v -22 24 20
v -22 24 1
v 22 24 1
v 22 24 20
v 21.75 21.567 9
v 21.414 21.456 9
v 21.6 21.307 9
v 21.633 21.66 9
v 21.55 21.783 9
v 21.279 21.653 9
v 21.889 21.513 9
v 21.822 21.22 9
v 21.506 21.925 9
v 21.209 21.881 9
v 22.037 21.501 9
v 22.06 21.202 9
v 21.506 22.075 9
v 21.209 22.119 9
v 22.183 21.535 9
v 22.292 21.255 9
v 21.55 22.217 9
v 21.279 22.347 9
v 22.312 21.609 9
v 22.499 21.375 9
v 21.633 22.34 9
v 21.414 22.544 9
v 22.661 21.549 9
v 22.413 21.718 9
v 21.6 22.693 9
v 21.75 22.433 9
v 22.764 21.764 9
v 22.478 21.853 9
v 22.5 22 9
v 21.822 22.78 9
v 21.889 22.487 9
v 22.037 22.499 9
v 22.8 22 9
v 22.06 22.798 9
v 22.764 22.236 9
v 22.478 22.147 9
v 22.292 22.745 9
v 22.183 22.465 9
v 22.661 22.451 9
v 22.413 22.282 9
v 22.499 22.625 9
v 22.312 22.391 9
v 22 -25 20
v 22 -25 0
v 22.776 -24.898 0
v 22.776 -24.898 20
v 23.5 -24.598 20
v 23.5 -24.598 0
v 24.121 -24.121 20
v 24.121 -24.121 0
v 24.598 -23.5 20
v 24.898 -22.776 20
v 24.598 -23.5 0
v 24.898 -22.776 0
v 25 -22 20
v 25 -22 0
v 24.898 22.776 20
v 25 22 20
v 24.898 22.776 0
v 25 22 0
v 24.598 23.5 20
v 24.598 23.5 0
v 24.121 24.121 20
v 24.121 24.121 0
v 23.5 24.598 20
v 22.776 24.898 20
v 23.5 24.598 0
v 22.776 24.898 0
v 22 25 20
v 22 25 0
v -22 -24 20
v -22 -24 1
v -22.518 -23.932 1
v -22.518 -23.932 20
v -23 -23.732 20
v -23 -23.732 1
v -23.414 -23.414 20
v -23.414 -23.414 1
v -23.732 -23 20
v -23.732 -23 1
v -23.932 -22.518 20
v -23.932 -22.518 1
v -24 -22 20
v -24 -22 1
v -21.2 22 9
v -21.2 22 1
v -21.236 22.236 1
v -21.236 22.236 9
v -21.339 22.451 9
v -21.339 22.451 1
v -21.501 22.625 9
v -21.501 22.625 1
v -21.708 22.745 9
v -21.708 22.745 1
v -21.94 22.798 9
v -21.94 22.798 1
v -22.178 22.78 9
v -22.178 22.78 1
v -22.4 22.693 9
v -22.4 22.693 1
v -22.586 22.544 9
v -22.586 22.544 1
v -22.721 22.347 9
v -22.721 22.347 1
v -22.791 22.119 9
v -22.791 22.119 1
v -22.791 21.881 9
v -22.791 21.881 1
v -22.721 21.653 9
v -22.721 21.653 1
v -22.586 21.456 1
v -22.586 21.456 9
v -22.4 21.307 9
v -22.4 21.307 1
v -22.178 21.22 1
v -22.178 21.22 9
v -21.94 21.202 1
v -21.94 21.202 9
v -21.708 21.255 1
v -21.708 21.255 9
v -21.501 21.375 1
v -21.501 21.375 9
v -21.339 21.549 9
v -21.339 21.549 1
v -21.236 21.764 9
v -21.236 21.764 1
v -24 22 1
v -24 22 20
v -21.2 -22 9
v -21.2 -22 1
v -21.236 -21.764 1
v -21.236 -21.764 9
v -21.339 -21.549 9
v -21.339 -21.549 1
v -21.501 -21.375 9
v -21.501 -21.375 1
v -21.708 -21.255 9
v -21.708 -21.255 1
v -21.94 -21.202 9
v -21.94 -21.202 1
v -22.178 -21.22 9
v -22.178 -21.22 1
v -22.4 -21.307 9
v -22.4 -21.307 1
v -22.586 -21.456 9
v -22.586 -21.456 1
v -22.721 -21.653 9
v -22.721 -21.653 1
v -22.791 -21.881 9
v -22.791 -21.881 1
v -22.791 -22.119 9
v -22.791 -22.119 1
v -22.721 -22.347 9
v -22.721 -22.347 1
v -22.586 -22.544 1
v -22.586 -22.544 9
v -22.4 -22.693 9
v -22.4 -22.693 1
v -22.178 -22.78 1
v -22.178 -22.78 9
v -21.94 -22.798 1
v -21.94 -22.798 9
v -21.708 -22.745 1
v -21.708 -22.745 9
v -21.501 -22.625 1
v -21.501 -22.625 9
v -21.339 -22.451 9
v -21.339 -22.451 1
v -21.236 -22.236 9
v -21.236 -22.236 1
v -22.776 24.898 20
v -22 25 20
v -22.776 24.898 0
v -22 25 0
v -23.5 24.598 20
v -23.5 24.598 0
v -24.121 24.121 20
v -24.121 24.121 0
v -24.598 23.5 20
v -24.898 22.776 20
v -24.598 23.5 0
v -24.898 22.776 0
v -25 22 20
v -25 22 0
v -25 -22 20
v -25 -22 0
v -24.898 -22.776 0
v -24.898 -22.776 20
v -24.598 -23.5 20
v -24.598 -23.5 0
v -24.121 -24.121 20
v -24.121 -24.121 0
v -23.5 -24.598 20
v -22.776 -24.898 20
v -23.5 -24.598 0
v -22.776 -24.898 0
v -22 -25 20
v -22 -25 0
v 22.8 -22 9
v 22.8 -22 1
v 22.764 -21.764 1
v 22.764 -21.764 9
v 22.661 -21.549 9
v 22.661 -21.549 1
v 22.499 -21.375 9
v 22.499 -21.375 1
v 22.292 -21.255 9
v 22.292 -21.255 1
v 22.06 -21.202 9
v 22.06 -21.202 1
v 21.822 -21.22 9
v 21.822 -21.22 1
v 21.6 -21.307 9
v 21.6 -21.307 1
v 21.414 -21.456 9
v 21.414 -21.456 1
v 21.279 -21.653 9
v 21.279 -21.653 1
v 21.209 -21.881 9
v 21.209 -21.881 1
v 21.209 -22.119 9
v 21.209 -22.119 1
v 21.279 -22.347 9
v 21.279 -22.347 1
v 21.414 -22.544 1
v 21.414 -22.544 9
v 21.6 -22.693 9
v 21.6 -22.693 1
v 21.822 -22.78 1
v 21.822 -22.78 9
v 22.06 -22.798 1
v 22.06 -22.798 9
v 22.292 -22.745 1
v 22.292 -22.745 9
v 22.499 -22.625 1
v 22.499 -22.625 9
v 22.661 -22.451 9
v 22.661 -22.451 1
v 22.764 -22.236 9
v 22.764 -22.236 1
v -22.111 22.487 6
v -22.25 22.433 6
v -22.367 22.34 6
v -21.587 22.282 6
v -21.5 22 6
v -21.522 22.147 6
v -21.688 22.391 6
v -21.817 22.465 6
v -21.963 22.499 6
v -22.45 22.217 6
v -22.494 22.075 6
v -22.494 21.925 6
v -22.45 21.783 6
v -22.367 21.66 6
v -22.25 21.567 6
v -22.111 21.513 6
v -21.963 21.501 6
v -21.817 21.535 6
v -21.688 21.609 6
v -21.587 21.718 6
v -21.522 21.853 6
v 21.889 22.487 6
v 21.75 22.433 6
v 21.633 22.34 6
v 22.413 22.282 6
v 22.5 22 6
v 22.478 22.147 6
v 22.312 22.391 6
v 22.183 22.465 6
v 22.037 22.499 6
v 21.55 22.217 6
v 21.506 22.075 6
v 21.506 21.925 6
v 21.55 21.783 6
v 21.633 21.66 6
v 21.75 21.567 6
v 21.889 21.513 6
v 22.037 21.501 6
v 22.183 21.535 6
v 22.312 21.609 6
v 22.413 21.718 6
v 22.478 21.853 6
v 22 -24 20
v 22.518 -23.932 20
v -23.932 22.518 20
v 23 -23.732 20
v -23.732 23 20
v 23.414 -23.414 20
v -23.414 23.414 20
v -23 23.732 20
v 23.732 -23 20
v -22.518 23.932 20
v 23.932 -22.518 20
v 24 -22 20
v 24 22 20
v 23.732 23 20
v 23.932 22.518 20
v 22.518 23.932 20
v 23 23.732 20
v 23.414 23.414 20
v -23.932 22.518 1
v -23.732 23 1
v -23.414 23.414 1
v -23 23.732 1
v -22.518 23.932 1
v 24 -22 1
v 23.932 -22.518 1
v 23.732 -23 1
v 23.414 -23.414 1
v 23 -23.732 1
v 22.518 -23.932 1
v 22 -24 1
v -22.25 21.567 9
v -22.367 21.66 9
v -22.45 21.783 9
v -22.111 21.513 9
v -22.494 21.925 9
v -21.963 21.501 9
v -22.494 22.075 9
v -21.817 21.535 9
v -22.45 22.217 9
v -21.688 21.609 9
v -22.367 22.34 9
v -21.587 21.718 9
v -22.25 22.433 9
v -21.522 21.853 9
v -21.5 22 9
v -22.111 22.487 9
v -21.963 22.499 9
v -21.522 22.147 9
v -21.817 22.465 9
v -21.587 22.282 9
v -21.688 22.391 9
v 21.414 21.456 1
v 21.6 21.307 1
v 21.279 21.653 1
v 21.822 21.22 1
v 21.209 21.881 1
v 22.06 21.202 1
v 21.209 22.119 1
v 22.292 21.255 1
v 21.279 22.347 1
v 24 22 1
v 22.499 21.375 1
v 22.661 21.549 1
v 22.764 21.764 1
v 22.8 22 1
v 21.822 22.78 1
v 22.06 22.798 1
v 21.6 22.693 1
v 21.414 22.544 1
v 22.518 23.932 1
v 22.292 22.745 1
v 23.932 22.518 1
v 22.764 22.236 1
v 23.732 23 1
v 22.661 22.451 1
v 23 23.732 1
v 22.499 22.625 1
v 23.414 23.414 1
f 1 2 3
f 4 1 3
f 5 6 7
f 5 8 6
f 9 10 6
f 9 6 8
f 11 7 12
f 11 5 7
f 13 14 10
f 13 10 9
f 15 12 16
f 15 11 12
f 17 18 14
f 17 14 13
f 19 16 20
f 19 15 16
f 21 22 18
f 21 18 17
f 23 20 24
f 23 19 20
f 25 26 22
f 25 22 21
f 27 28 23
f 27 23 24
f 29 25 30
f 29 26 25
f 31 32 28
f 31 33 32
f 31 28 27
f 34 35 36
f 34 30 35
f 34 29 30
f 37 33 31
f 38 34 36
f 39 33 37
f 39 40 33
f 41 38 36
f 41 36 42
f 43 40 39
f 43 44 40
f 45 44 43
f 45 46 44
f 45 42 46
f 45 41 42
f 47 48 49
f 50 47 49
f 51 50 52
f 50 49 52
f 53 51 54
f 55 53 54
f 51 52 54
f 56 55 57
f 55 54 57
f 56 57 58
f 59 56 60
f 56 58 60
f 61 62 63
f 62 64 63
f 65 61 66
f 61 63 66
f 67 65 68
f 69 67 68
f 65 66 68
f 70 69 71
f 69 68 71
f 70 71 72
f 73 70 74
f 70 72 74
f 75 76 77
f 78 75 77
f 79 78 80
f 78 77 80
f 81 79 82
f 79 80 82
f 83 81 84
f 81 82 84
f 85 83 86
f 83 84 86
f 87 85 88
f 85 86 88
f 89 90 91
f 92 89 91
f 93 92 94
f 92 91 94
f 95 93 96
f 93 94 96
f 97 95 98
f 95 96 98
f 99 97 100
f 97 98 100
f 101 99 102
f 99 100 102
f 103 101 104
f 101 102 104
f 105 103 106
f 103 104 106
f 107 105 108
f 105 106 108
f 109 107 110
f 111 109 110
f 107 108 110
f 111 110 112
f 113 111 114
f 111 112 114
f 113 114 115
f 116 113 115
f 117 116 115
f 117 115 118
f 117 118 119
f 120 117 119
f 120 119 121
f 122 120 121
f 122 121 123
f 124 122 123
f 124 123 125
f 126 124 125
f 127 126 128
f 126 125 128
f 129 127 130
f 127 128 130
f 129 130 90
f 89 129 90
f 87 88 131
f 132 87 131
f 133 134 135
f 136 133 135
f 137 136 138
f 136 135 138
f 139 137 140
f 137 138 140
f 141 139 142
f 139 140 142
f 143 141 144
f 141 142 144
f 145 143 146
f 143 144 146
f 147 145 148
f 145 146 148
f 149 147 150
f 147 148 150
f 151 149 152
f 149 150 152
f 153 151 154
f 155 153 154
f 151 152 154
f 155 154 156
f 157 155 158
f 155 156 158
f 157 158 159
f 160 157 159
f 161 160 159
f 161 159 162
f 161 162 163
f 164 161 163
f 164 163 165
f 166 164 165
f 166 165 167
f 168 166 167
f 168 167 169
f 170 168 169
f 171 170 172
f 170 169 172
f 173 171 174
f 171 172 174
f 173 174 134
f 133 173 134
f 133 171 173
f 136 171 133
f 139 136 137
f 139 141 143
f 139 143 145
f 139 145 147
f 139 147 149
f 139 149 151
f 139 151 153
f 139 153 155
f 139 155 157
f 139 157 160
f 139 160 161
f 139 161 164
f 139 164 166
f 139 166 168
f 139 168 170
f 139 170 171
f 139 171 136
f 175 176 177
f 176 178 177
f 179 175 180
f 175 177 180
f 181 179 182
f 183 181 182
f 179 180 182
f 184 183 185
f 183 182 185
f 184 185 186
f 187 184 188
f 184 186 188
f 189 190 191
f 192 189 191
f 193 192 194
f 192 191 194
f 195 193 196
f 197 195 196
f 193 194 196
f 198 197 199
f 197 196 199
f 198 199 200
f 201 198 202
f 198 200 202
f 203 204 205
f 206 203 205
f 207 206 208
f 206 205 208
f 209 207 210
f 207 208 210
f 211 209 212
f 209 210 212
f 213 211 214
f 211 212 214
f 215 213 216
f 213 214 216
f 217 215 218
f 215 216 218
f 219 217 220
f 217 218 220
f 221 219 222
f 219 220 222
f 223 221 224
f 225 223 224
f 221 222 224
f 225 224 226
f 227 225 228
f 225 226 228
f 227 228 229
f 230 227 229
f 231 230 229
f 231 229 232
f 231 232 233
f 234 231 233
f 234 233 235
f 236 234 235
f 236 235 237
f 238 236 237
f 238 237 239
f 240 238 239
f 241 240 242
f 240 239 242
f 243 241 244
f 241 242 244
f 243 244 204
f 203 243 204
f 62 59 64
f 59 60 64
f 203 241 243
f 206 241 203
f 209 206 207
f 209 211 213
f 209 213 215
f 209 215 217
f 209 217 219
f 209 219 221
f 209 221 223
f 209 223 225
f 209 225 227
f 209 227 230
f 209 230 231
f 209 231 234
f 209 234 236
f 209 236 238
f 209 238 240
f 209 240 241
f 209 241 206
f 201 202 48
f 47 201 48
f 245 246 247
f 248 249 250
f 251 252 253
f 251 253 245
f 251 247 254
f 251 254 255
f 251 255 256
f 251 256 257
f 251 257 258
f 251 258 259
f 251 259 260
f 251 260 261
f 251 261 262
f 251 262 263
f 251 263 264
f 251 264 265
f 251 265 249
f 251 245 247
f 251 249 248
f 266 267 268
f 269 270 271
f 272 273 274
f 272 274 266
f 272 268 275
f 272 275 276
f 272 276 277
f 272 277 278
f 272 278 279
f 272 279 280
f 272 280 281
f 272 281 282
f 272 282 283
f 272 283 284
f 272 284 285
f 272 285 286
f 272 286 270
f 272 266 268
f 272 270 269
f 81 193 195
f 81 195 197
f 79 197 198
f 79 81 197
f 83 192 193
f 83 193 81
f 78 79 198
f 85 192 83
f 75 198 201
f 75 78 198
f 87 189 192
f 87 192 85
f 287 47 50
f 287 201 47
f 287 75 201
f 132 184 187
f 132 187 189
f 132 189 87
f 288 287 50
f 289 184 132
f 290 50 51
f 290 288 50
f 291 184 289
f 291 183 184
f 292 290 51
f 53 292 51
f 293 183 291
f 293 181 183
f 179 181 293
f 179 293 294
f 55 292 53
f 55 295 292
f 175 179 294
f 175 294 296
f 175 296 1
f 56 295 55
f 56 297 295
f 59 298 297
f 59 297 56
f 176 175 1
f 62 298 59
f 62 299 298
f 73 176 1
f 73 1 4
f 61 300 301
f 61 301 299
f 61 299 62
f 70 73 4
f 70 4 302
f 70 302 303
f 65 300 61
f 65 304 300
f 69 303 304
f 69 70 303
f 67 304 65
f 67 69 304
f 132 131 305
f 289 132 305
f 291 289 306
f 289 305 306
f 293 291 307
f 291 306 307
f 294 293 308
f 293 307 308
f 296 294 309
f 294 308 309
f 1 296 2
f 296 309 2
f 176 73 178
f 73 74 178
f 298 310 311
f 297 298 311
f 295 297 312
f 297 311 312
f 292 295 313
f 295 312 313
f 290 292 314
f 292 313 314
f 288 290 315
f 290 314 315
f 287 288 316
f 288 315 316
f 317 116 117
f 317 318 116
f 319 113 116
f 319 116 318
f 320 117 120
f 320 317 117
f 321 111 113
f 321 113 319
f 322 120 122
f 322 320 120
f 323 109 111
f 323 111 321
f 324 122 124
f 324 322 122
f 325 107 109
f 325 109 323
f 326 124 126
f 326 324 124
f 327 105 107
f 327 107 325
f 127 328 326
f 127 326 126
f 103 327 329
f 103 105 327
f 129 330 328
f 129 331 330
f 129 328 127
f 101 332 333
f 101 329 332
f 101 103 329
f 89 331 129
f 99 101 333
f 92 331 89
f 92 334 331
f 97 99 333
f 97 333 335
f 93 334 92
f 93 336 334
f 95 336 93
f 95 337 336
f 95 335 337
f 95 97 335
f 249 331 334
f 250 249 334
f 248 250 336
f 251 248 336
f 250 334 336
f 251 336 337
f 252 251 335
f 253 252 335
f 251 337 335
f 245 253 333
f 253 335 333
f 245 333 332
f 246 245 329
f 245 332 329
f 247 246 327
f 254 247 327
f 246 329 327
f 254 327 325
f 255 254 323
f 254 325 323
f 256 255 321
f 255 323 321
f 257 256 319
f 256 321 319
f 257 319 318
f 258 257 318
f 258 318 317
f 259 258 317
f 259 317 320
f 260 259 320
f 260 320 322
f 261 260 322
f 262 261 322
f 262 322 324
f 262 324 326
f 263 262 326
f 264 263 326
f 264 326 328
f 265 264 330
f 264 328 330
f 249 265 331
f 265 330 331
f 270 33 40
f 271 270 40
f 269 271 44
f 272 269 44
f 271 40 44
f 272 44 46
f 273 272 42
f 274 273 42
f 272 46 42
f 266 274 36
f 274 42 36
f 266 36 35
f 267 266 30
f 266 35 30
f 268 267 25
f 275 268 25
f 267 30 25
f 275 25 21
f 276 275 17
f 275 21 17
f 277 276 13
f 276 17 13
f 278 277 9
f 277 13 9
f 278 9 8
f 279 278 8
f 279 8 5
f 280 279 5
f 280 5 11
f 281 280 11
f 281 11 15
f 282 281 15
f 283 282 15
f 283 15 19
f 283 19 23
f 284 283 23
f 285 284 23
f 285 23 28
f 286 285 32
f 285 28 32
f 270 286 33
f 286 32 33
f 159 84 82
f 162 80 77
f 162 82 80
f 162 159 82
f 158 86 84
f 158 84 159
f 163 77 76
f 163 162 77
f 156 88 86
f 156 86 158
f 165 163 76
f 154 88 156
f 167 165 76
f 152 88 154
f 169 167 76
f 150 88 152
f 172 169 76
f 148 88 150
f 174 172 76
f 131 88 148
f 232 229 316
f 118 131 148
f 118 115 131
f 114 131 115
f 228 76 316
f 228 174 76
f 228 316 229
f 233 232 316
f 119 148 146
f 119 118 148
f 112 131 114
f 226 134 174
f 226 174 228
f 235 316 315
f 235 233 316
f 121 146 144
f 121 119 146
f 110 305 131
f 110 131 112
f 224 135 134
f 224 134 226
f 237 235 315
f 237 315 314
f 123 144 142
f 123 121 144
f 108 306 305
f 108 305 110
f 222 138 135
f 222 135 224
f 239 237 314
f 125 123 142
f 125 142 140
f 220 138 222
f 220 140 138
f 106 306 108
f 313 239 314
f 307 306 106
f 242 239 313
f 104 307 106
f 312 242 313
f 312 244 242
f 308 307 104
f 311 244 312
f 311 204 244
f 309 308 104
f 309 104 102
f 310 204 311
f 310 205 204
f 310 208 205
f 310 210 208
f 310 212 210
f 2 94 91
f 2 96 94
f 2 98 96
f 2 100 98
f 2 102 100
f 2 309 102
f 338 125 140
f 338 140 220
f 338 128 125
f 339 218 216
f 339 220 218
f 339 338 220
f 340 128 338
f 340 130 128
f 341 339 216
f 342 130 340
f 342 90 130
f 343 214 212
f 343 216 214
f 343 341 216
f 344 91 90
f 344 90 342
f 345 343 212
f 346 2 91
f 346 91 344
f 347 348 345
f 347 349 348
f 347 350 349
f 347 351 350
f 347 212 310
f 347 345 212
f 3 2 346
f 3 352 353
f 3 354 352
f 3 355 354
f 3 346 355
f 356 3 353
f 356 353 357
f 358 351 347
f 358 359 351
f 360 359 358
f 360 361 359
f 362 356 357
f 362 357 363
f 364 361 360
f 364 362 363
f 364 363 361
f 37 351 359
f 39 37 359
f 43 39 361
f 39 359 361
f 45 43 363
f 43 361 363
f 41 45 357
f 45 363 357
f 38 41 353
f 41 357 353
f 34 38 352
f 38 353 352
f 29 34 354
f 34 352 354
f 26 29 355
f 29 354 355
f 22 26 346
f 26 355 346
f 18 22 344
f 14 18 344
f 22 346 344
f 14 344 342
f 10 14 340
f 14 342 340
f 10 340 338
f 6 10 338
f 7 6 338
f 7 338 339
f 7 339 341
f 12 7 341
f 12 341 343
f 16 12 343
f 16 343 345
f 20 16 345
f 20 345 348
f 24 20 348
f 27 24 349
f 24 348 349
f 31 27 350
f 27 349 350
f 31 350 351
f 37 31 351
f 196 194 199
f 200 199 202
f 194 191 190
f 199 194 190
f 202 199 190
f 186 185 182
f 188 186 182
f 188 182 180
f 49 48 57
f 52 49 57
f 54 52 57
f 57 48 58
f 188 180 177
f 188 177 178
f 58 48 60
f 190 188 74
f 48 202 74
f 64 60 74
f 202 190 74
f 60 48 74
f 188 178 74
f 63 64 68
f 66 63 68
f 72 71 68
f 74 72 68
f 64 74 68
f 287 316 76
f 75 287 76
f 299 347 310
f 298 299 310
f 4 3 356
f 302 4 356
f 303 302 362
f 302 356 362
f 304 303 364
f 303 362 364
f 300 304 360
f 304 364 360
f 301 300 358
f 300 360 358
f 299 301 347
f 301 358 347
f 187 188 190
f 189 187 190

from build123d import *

# Parameters (mm, degrees)
EXTRUDE_4_DEPTH             = 1
EXTRUDE_5_DEPTH             = 19
SKETCH_12_R                 = 0.8
EXTRUDE_7_DEPTH             = 8
SKETCH_13_R                 = 0.5
CUT_EXTRUDE_1_DEPTH         = 3
PATTERN_LINEAR_1_COUNT      = 2
PATTERN_LINEAR_1_PITCH      = 44
PATTERN_LINEAR_1_COUNT_DIR2 = 2
PATTERN_LINEAR_1_PITCH_DIR2 = 44
PATTERN_LINEAR_2_COUNT      = 2
PATTERN_LINEAR_2_PITCH      = 44
PATTERN_LINEAR_2_COUNT_DIR2 = 2
PATTERN_LINEAR_2_PITCH_DIR2 = 44


with BuildPart() as part:
    # 草图1 → 凸台-拉伸4 (new body)
    with BuildSketch(Plane.XY):
        with BuildLine():
            Line((22, 25), (-22, 25))
            ThreePointArc((-22, 25), (-24.121320344, 24.121320344), (-25, 22))
            Line((-25, 22), (-25, -22))
            ThreePointArc((-25, -22), (-24.121320344, -24.121320344), (-22, -25))
            Line((-22, -25), (22, -25))
            ThreePointArc((22, -25), (24.121320344, -24.121320344), (25, -22))
            Line((25, -22), (25, 22))
            ThreePointArc((25, 22), (24.121320344, 24.121320344), (22, 25))
        make_face()
    extrude(amount=EXTRUDE_4_DEPTH)

    # 草图7 → 凸台-拉伸5 (add)
    with BuildSketch(Plane.XY.offset(1)):
        with BuildLine():
            ThreePointArc((22, -25), (24.121320344, -24.121320344), (25, -22))
            Line((25, -22), (25, 22))
            ThreePointArc((25, 22), (24.121320344, 24.121320344), (22, 25))
            Line((22, 25), (-22, 25))
            ThreePointArc((-22, 25), (-24.121320344, 24.121320344), (-25, 22))
            Line((-25, 22), (-25, -22))
            ThreePointArc((-25, -22), (-24.121320344, -24.121320344), (-22, -25))
            Line((-22, -25), (22, -25))
        make_face()
        with BuildLine():
            Line((22, -24), (-22, -24))
            ThreePointArc((-22, -24), (-23.414213562, -23.414213562), (-24, -22))
            Line((-24, -22), (-24, 22))
            ThreePointArc((-24, 22), (-23.414213562, 23.414213562), (-22, 24))
            Line((-22, 24), (22, 24))
            ThreePointArc((22, 24), (23.414213562, 23.414213562), (24, 22))
            Line((24, 22), (24, -22))
            ThreePointArc((24, -22), (23.414213562, -23.414213562), (22, -24))
        make_face(mode=Mode.SUBTRACT)
    extrude(amount=EXTRUDE_5_DEPTH)

    # 草图12 → 凸台-拉伸7 (add)
    with BuildSketch(Plane.XY.offset(1)):
        with Locations((-22, 22)):
            Circle(SKETCH_12_R)
    extrude_7 = extrude(amount=EXTRUDE_7_DEPTH)

    # 草图13 → 切除-拉伸1 (cut)
    with BuildSketch(Plane.XY.offset(9)):
        with Locations((-22, 22)):
            Circle(SKETCH_13_R)
    cut_extrude_1 = extrude(amount=-CUT_EXTRUDE_1_DEPTH, mode=Mode.SUBTRACT)

    # 阵列(线性)1: Extrude 7 2 × 2
    with Locations(*[(i * PATTERN_LINEAR_1_PITCH, -j * PATTERN_LINEAR_1_PITCH_DIR2, 0) for i in range(PATTERN_LINEAR_1_COUNT) for j in range(PATTERN_LINEAR_1_COUNT_DIR2) if (i, j) != (0, 0)]):
        add(extrude_7)

    # 阵列(线性)2: Cut-Extrude 1 2 × 2
    with Locations(*[Vector(1, 0, 0) * (i * PATTERN_LINEAR_2_PITCH) + Vector(1, 0, 0) * (j * PATTERN_LINEAR_2_PITCH_DIR2) for i in range(PATTERN_LINEAR_2_COUNT) for j in range(PATTERN_LINEAR_2_COUNT_DIR2) if (i, j) != (0, 0)]):
        add(cut_extrude_1, mode=Mode.SUBTRACT)


solid = part.part
